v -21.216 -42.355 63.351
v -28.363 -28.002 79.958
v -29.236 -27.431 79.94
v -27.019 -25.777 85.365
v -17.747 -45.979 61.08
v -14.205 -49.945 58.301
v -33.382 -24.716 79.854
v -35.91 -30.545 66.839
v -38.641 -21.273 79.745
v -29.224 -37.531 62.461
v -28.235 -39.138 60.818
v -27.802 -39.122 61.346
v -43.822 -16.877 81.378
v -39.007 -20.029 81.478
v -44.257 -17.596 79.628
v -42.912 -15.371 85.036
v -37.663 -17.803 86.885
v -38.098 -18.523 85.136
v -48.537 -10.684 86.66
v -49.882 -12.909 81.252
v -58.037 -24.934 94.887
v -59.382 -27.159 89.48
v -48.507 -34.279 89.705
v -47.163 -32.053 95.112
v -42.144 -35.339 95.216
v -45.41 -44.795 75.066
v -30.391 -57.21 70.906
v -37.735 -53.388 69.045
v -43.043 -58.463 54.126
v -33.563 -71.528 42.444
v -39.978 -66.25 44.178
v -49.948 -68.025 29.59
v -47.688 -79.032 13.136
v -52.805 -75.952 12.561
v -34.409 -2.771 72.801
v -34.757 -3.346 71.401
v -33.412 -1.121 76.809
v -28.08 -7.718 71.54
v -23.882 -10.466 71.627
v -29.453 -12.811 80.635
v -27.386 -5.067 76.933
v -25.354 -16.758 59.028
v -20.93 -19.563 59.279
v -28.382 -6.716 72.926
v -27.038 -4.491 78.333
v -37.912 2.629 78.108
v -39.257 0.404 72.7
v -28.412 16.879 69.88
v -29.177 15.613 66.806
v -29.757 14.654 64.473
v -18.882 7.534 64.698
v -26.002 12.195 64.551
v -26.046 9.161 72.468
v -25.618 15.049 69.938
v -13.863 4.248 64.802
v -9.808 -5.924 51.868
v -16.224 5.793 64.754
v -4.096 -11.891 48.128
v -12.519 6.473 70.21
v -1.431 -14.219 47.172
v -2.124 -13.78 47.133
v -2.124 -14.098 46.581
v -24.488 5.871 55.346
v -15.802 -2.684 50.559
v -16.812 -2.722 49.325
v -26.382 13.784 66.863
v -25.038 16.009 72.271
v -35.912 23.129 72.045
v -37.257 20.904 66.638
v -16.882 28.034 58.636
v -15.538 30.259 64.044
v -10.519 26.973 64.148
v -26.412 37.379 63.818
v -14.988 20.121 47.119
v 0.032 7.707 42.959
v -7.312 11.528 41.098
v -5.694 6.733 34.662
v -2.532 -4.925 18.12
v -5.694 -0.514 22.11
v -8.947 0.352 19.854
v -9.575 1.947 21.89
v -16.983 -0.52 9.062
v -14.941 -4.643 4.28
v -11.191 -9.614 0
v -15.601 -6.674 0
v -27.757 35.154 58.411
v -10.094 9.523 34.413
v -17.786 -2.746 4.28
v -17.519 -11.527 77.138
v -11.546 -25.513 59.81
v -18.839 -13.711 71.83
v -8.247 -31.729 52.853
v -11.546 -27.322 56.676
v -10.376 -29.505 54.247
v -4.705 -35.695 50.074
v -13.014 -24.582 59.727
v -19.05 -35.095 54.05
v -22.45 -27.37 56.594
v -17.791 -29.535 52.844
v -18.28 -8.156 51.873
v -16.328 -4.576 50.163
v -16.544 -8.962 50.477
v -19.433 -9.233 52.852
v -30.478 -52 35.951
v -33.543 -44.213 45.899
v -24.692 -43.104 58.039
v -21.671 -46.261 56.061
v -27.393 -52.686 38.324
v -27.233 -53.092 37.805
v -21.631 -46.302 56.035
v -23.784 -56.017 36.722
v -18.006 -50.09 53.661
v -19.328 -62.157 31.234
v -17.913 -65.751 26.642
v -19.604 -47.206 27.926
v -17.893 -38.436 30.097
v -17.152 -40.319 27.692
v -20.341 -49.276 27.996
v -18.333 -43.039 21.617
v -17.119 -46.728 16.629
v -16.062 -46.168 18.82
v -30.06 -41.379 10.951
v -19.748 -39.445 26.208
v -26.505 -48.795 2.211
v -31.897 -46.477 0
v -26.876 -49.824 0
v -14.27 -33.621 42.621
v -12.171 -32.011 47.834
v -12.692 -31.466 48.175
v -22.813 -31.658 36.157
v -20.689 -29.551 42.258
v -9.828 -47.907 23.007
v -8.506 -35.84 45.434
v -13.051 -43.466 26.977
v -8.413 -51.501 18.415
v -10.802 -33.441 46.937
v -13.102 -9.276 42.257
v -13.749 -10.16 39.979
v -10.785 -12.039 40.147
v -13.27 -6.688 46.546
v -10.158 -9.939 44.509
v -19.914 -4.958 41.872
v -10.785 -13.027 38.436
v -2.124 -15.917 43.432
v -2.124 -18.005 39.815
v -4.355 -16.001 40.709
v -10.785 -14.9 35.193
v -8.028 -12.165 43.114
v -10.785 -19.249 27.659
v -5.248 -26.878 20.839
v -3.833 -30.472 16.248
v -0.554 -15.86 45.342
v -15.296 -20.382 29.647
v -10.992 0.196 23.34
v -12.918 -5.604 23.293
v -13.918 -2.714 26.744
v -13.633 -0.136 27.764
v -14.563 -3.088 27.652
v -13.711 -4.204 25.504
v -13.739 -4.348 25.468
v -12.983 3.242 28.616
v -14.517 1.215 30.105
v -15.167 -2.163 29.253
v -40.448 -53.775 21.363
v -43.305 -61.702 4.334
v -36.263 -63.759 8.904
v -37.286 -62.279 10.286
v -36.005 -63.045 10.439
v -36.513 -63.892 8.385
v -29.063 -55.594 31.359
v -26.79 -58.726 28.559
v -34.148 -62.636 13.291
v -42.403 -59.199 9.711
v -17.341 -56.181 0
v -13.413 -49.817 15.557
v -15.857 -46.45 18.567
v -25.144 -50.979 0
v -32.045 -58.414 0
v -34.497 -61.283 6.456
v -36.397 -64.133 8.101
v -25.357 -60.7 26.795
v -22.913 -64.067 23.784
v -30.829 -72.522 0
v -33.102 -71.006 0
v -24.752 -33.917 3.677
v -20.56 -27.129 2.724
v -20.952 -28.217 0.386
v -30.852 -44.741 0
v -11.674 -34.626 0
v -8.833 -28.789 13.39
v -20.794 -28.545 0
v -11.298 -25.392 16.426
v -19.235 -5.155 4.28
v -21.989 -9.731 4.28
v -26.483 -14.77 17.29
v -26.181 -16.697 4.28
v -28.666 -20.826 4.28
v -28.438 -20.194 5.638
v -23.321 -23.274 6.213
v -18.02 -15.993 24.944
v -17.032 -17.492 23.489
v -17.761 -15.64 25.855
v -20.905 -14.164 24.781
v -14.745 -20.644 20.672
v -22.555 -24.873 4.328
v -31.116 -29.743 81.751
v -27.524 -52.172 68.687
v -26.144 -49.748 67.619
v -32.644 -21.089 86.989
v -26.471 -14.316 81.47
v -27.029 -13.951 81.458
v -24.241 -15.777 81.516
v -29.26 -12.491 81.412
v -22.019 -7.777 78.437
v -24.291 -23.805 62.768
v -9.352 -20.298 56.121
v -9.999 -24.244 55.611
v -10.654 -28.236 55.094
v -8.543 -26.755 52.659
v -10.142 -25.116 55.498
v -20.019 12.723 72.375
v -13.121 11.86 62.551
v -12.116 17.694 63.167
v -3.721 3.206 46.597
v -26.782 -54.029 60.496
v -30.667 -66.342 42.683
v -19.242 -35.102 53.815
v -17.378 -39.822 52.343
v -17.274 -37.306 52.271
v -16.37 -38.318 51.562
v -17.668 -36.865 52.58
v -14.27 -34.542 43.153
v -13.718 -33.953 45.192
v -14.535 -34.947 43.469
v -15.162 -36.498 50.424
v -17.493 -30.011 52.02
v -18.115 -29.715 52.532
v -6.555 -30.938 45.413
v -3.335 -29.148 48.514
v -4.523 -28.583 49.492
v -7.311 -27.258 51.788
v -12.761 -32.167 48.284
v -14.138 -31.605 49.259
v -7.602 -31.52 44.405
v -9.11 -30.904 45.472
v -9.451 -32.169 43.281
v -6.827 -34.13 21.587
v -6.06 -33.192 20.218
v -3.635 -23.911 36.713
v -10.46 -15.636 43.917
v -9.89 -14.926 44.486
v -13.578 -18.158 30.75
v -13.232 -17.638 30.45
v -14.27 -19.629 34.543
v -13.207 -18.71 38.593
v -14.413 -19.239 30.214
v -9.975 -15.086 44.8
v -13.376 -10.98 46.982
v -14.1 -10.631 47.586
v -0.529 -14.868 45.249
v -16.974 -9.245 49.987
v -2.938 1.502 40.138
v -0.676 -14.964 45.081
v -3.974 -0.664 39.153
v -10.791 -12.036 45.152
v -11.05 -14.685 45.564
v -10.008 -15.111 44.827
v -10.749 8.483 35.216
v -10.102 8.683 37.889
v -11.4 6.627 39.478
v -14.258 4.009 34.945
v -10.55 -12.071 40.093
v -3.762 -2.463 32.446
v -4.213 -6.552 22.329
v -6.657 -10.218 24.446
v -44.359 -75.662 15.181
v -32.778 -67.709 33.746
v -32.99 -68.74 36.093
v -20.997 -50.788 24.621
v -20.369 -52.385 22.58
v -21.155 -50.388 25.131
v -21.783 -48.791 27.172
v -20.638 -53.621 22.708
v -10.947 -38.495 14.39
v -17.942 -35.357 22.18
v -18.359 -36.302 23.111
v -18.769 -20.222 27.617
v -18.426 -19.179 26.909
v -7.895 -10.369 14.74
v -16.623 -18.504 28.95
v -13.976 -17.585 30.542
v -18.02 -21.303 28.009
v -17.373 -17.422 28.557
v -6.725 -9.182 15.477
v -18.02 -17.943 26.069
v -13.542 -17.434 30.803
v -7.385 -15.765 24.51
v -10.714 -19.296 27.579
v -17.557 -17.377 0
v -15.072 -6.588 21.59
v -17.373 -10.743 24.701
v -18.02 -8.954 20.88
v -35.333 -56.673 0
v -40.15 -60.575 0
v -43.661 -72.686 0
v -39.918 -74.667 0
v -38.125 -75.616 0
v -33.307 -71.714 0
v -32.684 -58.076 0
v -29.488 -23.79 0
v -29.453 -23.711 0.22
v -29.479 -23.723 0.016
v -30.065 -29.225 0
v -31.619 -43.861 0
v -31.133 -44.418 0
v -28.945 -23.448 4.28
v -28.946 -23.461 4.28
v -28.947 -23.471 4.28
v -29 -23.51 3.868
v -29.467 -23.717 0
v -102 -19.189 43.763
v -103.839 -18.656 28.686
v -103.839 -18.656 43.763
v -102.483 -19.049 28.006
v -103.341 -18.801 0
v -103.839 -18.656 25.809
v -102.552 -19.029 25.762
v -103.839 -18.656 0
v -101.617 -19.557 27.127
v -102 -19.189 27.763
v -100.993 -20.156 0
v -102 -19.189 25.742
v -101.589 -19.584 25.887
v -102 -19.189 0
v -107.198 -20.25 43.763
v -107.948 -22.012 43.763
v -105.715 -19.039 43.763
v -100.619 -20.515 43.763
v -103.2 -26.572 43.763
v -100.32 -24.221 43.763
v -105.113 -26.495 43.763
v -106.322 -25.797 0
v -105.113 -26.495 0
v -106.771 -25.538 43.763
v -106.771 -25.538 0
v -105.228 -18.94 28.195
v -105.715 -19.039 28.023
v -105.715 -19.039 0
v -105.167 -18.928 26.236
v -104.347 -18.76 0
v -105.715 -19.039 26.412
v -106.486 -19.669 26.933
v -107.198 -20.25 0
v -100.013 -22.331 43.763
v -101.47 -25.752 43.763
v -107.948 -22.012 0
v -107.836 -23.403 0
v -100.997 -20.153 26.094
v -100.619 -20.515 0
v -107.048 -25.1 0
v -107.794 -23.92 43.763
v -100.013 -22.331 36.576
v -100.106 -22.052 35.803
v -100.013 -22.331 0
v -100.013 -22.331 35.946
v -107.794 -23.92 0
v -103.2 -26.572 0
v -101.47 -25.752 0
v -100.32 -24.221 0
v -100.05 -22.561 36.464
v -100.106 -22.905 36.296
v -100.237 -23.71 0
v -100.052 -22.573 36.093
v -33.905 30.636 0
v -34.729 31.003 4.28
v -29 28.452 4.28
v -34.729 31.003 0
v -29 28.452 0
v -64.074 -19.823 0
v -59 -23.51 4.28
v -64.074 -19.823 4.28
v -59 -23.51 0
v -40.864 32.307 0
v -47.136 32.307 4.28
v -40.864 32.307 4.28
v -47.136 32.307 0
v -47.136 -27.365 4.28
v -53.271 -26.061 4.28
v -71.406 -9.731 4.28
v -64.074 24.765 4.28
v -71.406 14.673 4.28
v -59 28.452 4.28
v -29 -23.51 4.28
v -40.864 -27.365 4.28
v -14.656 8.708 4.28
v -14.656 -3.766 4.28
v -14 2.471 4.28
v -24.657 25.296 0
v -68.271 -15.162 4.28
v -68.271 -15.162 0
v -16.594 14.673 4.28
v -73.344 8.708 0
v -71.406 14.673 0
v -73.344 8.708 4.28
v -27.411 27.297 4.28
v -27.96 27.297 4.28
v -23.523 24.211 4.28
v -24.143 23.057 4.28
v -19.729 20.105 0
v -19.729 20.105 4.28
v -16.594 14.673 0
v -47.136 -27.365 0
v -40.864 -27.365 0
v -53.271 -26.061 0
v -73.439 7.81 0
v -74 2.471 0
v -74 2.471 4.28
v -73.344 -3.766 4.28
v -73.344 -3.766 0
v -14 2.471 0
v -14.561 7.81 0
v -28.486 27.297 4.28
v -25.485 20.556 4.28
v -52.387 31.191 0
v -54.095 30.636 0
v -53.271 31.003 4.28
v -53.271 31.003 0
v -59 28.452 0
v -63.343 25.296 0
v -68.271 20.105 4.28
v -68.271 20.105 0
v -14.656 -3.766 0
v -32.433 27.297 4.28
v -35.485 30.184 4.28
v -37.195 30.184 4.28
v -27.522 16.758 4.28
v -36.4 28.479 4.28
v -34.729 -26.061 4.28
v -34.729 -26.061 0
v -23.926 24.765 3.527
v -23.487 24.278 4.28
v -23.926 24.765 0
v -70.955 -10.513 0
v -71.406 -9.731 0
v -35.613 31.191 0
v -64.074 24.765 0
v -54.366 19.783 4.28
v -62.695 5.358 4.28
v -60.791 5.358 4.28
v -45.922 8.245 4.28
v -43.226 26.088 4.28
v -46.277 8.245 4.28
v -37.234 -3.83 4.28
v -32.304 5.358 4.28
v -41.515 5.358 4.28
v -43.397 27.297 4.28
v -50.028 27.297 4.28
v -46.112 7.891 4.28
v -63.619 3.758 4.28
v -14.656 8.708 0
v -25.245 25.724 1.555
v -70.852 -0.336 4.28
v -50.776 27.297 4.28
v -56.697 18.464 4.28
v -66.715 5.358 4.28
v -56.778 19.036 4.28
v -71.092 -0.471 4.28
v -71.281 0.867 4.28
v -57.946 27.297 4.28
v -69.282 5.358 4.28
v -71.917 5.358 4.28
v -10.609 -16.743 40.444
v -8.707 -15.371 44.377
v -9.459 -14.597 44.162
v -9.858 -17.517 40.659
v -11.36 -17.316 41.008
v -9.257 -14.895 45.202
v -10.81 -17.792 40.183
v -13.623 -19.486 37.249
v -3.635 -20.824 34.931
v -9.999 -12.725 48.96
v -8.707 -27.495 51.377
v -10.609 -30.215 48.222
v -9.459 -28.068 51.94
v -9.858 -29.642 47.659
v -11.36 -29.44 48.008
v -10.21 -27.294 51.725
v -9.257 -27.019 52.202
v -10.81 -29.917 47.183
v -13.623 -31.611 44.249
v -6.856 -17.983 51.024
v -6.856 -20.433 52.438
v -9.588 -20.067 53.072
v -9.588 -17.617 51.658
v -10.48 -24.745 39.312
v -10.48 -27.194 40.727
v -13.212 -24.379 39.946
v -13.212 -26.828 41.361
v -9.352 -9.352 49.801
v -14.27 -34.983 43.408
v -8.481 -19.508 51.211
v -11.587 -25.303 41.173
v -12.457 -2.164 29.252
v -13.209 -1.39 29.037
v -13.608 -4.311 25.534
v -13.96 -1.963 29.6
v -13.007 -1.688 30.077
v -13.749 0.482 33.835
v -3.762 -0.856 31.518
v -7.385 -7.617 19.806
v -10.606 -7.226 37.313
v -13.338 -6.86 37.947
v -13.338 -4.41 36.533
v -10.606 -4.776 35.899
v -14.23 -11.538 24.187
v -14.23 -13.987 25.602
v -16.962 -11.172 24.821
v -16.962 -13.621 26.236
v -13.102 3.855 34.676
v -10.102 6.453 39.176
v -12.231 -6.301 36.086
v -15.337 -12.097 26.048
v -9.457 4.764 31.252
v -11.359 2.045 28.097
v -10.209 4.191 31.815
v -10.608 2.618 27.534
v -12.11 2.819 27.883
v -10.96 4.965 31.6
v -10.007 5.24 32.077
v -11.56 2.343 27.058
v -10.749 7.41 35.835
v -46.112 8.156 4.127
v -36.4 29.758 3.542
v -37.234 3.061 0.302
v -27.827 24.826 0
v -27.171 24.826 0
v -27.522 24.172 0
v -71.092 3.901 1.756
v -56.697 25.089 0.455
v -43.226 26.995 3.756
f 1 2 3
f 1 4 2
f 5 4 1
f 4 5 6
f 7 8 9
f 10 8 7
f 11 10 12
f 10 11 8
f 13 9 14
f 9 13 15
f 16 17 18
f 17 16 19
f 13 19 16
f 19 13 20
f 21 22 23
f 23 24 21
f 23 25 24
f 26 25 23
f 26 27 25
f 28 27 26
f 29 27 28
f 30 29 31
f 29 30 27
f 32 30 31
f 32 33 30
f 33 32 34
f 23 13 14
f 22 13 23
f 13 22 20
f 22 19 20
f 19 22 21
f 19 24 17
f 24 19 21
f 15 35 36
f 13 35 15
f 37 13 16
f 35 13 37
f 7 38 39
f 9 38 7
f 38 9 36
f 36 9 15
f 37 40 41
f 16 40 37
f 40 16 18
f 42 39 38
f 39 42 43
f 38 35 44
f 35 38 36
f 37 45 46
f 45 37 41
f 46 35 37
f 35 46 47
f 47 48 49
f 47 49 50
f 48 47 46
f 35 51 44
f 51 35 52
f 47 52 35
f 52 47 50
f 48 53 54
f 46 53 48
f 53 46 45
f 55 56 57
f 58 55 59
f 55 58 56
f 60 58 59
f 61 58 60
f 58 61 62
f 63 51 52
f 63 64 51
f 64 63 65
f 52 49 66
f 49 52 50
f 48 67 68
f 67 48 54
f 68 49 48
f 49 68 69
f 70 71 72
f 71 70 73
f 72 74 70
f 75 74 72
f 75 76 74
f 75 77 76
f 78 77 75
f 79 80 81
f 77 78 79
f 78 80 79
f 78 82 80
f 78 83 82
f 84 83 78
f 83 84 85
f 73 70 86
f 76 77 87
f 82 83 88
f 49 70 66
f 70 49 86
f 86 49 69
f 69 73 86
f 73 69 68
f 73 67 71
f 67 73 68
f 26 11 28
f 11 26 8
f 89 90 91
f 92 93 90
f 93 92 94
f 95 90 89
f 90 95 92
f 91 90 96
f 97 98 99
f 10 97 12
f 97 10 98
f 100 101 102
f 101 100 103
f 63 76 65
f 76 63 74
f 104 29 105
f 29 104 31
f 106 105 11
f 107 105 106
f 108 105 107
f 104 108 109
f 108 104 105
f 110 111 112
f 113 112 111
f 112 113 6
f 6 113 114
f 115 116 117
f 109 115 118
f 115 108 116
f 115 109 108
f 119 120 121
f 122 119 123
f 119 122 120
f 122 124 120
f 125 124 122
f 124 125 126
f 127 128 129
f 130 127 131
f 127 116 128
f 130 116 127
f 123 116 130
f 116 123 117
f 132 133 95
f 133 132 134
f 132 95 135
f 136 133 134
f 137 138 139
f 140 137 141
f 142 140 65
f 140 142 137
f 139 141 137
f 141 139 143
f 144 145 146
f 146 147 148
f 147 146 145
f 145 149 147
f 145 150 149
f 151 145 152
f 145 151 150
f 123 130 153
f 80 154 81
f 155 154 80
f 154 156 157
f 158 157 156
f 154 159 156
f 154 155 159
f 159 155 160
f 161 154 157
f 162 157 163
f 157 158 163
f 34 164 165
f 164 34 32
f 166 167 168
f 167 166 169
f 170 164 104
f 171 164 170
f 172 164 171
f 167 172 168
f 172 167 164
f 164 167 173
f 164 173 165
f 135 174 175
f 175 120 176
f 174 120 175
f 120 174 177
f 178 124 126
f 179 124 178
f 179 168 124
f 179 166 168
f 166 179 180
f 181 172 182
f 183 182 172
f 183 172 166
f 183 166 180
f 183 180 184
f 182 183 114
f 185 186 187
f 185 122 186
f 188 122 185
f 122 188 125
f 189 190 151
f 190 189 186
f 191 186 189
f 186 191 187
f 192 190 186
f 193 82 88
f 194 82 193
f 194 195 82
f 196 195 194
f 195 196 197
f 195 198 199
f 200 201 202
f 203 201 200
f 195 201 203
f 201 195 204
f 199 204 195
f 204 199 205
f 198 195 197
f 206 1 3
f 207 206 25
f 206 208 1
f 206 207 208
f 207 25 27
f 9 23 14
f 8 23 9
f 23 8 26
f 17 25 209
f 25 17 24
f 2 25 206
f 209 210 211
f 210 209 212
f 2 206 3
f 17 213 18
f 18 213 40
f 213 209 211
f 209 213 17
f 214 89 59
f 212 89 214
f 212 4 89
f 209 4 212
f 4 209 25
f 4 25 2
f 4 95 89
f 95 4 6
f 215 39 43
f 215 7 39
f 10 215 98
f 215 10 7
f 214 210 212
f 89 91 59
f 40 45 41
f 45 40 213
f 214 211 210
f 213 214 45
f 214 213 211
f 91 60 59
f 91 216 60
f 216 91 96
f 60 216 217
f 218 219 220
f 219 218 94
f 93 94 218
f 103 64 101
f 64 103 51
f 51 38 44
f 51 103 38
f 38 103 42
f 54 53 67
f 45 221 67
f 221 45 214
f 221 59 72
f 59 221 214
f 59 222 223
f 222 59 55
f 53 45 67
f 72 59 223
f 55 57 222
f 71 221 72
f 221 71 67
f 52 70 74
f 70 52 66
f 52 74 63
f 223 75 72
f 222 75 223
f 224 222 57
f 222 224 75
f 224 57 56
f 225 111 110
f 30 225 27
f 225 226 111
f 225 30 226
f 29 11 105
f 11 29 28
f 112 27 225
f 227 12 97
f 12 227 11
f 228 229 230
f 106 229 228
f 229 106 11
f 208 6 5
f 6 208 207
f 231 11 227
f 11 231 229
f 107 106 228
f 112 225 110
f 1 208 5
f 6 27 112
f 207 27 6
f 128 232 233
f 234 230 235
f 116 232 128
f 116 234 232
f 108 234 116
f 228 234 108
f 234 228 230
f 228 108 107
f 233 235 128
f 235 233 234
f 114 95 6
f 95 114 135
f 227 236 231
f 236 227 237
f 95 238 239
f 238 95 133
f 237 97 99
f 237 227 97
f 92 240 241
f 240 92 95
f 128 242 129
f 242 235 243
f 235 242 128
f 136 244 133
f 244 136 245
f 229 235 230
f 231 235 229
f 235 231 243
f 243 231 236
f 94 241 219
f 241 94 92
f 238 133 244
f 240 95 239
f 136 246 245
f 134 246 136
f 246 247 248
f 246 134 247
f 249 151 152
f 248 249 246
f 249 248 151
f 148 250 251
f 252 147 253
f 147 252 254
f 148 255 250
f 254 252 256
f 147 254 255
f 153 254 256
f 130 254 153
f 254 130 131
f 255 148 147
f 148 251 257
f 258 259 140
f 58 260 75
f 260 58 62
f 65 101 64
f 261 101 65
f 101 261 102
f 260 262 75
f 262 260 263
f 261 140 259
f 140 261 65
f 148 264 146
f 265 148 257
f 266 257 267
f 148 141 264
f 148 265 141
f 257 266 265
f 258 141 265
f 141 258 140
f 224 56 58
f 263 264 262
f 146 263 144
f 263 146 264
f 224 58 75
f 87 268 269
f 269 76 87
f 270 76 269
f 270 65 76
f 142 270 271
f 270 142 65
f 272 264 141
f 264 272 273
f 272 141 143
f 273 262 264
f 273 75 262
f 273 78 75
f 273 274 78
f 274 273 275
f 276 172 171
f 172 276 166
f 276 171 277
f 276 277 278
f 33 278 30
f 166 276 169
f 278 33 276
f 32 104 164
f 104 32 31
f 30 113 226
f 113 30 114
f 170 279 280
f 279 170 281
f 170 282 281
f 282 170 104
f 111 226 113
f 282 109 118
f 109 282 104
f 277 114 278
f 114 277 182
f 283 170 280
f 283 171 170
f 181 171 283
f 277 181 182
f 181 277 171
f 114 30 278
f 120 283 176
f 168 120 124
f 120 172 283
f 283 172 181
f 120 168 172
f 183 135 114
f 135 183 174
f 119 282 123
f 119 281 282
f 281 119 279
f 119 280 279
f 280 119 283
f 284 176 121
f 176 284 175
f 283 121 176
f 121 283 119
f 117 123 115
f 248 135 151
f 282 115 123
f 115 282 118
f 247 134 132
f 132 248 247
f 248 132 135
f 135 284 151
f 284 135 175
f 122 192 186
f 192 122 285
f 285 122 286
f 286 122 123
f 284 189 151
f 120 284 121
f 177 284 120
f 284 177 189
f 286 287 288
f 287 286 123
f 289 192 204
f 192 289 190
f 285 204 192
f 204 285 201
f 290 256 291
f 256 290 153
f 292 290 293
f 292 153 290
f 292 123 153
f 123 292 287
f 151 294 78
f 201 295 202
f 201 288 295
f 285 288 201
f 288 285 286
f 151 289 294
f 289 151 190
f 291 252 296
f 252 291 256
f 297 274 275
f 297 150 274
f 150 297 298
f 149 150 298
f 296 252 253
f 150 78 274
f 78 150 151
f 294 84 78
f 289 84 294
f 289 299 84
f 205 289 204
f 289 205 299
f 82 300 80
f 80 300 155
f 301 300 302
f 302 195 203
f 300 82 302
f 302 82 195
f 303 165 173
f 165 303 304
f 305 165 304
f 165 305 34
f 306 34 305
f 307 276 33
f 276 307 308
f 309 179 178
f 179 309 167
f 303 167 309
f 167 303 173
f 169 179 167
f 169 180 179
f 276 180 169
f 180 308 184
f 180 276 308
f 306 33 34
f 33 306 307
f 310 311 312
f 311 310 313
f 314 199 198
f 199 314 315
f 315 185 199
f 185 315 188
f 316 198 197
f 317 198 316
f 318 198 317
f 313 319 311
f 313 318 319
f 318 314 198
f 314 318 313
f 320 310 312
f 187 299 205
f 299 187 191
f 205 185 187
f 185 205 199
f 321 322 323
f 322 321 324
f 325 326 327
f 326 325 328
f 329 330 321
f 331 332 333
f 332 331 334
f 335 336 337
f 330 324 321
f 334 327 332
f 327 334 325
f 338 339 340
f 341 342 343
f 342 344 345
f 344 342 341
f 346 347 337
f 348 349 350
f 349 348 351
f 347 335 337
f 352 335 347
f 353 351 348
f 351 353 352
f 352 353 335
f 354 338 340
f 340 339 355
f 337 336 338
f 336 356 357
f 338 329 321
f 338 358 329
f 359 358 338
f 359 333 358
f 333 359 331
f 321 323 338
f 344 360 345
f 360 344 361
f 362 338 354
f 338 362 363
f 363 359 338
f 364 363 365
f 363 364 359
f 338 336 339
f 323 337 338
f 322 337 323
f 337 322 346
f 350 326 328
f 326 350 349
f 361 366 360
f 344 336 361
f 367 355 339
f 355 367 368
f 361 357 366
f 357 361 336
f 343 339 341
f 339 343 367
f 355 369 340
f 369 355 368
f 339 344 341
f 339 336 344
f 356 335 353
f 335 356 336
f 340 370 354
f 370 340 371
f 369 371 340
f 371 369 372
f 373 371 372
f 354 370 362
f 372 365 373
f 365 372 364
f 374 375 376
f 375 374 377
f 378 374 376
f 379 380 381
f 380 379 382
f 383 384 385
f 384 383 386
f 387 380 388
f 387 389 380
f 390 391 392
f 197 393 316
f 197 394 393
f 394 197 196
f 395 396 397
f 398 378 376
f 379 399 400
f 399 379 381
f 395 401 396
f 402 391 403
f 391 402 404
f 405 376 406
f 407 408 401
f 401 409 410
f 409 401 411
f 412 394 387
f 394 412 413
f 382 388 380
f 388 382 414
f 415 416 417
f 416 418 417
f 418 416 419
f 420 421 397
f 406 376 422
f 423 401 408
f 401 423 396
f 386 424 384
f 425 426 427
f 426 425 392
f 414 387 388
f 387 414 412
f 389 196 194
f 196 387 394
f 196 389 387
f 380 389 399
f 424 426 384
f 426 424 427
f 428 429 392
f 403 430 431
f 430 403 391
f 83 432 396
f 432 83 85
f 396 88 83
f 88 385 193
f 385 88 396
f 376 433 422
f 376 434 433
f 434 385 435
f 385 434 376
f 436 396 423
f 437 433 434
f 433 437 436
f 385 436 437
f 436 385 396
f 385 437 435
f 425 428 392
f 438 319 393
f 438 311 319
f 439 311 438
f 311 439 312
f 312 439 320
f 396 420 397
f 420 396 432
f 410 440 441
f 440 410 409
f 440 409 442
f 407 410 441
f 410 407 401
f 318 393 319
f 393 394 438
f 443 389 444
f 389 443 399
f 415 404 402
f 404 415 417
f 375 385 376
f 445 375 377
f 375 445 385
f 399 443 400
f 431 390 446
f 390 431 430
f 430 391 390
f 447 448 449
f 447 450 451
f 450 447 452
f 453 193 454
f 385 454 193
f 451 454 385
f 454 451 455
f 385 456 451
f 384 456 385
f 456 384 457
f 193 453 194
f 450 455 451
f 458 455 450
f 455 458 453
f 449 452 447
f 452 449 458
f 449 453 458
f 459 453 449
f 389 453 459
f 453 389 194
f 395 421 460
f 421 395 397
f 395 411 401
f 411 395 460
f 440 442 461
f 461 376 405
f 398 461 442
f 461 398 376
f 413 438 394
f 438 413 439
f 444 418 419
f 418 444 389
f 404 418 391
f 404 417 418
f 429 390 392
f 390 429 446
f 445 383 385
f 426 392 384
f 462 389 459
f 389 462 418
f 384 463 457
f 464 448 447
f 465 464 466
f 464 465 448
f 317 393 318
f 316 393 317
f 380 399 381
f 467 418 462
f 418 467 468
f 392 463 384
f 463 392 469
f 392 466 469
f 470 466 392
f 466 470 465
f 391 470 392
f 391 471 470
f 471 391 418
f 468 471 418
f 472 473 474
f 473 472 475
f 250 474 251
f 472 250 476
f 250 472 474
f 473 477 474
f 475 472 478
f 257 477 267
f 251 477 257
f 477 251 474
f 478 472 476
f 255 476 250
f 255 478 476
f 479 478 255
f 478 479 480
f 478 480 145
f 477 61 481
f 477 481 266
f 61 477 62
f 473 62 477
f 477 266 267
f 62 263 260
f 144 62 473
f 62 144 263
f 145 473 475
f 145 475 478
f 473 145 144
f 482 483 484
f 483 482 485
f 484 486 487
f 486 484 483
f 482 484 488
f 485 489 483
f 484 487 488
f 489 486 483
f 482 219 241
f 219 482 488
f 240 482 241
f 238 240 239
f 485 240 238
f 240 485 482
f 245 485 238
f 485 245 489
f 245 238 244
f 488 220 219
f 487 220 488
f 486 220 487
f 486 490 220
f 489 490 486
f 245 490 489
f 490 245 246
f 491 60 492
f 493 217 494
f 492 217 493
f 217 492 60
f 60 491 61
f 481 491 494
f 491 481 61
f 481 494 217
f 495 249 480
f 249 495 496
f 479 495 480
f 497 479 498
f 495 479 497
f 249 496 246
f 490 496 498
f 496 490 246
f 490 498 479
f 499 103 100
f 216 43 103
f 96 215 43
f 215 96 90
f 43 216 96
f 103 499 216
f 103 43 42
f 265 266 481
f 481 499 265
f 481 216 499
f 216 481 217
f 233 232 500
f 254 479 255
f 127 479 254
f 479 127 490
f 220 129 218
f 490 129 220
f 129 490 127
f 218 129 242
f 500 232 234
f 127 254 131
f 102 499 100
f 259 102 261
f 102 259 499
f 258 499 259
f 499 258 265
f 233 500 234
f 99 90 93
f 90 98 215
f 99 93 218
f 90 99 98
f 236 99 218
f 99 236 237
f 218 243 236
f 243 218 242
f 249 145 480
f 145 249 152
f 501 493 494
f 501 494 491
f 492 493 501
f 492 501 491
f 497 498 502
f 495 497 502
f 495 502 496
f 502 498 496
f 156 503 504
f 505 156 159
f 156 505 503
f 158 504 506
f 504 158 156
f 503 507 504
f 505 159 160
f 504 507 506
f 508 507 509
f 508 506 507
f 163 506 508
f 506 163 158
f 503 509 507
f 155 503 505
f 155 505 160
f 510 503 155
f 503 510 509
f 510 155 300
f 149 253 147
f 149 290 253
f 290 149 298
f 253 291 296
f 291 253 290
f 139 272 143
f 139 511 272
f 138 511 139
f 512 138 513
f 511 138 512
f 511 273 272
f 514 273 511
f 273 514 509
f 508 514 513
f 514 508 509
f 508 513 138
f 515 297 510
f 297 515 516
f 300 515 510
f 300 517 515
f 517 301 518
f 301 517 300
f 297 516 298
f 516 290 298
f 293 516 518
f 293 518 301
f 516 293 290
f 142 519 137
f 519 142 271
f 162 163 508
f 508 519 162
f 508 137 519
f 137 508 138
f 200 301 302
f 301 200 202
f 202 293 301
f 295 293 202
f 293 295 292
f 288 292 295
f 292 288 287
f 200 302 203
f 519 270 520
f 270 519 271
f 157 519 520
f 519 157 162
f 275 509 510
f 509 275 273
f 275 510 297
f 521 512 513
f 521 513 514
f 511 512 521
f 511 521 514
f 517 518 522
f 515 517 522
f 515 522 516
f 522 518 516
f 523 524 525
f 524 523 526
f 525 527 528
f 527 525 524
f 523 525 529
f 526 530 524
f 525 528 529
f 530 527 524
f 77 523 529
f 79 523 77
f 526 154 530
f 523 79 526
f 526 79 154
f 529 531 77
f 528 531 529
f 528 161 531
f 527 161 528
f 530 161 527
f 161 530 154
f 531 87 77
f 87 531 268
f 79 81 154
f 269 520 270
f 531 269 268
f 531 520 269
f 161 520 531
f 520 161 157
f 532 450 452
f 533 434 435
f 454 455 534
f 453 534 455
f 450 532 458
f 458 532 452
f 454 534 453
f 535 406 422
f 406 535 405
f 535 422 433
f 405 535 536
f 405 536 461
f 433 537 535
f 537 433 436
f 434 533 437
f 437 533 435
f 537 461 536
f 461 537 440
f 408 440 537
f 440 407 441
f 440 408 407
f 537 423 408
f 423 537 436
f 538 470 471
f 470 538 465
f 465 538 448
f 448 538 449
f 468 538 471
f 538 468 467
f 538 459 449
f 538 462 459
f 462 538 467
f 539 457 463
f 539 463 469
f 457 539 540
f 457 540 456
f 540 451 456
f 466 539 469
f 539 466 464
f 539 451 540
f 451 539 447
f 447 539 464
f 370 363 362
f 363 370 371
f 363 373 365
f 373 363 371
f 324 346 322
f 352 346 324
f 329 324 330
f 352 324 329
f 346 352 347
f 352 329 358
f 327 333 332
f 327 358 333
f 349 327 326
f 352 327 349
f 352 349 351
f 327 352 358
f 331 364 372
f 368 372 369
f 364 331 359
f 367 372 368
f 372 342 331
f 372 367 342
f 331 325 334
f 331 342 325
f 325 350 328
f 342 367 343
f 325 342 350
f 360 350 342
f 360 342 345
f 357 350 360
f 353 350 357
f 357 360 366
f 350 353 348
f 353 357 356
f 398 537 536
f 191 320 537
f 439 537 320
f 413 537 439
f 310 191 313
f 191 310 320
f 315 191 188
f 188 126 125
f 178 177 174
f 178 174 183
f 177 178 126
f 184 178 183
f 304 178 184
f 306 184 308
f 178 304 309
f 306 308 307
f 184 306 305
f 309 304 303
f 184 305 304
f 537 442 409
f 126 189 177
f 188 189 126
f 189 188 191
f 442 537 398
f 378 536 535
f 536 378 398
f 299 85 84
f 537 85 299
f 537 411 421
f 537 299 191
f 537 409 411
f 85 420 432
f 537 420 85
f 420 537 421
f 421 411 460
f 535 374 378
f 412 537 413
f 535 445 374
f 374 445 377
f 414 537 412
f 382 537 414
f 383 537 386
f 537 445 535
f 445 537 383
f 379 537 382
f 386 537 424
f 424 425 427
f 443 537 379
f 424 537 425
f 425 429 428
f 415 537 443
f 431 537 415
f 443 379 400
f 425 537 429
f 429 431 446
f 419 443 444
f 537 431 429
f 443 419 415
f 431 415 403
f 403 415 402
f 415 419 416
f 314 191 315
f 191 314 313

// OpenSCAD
// file: cherry_mx_keyhole.scad
/*
 * A blockout used for creating Cherry MX keyswitch receptacles in solid objects.
 * Dimensions referenced and approximate those used by gcb's switch_mx.scad:
 * https://bitbucket.org/gcb/3dump/src/8c0555016ecb091764b122b7b80777f2fc6ce9c2/keyboards/cherry/switch_mx.scad
 */

module copymirror(v) {
    children();
    mirror(v) children();
}
module cmxsw() {}
module cherry_mx_keyhole() {
    color("red") difference() {
        union() {
            // body
            translate([0,0,-9.3-5.5/2]) cube([14,14,5.5],true);
            // cap clearance
            translate([0,0,-.16]) cube([19,19,20], true);
            // pin clearance
            translate([0,0,-14.5-6/2]) cube([14,14,6], true);
            // clips
            copymirror([0,-1,0]) translate([0,7,-12]) intersection() {
                rotate([45,0,0]) cube([6,1.1,1.1], true);
                rotate([-90,0,0]) cylinder(3,3,0,$fn=4);
            }
        }
        // recesses
        copymirror([-1,0,0]) translate([7,0,-12]) rotate([45,0,0]) rotate([0,-90,0]) cylinder(1,2,0,$fn=4);
    }
}

cherry_mx_keyhole();
// main file
use <cherry_mx_keyhole.scad>

module keyandsacap() {
    translate([0,0,-5.7]) {
        hull() {
            cube([18.4,18.4,.01], true);
            translate([0,0,11.73]) cube([18.4-5.7,18.4-5.7,.01], true);
        }
        translate([0,0,3.5]) cmxsw();
    }
}
module keyanddsacap() {
    translate([0,0,-5.7]) {
        hull() {
            cube([18.4,18.4,.01], true);
            translate([0,0,5.7]) cube([18.4-5.7,18.4-5.7,.01], true);
        }
        translate([0,0,-12]) cube([19,19,20],true);
    }
}
module keyblockout() {
    translate([0,0,-2.2]) cherry_mx_keyhole();
}

module rotateat(a,v){
    translate(v) { rotate(a) translate(-v) children(); }
}

function lin(s, e, pct) = s + pct * (e - s);

sep = 19;
finger_lengths = [110-15,110-0,110-12,110-32];
//key_angles = [30, 15, 0, -45];
module key(row, findex) {
    extend = lin(.5, 1, pow(row/3,.8));
        rotate([0, lin(30, 70,
            row/3
            * pow(78/finger_lengths[findex], 0)
            //pow((row+1)/4,0))*pow(78/finger_lengths[findex],0)
        ), 0])
            translate([-finger_lengths[findex]*extend, findex*sep, 0])
                rotate([0, lin(-60,30,extend), 0])
                    children(0);
}
module hand() {
    for(row = [0:3], findex=[0:3])
        key(row, findex) children(0);
}
module span() {
    for(row = [0:3], findex=[0:3]) {
        if (row < 3) hull() {
            key(row, findex) children(0);
            key(row+1, findex) children(1);
        }
        if (findex < 3) hull() {
            key(row, findex) children(0);
            key(row, findex+1) children(0);
        }
    }
}
difference(){ // carve off everything below 0z
difference(){ // nothing should override keycap clearance
    translate([0,0,85])
    rotate([-30,0,0])
    rotate([0,-90,0])
    union(){
        // plates for each socket
        translate([0,0,85])
        rotate([-30,0,0])
        rotate([0,-90,0])
        hand() translate([-sep/2,-sep/2,-18]) cube([sep,sep,6]);
        // joiners between the plates
        translate([0,0,85])
        rotate([-30,0,0])
        rotate([0,-90,0])
        span() {
            translate([-sep/2+3,0,-15]) cube([6,sep,6], true);
            translate([0,0,-15]) cube([sep,sep,6], true);
        }
        translate([-99,31,104]) rotate([90,30,60]) cylinder(60,4,4);
        translate([-73,45,44]) rotate([90,30,60]) cylinder(5,30,30);
    }
    //translate([14,0,-8]) rotate([0,-55,0]) cube([10,19.5,20], true);
    translate([0,0,85])
    rotate([-30,0,0])
    rotate([0,-90,0])
    hand() keyblockout();
}
translate([-100,0,-15]) cube([200,200,30], true);
}
